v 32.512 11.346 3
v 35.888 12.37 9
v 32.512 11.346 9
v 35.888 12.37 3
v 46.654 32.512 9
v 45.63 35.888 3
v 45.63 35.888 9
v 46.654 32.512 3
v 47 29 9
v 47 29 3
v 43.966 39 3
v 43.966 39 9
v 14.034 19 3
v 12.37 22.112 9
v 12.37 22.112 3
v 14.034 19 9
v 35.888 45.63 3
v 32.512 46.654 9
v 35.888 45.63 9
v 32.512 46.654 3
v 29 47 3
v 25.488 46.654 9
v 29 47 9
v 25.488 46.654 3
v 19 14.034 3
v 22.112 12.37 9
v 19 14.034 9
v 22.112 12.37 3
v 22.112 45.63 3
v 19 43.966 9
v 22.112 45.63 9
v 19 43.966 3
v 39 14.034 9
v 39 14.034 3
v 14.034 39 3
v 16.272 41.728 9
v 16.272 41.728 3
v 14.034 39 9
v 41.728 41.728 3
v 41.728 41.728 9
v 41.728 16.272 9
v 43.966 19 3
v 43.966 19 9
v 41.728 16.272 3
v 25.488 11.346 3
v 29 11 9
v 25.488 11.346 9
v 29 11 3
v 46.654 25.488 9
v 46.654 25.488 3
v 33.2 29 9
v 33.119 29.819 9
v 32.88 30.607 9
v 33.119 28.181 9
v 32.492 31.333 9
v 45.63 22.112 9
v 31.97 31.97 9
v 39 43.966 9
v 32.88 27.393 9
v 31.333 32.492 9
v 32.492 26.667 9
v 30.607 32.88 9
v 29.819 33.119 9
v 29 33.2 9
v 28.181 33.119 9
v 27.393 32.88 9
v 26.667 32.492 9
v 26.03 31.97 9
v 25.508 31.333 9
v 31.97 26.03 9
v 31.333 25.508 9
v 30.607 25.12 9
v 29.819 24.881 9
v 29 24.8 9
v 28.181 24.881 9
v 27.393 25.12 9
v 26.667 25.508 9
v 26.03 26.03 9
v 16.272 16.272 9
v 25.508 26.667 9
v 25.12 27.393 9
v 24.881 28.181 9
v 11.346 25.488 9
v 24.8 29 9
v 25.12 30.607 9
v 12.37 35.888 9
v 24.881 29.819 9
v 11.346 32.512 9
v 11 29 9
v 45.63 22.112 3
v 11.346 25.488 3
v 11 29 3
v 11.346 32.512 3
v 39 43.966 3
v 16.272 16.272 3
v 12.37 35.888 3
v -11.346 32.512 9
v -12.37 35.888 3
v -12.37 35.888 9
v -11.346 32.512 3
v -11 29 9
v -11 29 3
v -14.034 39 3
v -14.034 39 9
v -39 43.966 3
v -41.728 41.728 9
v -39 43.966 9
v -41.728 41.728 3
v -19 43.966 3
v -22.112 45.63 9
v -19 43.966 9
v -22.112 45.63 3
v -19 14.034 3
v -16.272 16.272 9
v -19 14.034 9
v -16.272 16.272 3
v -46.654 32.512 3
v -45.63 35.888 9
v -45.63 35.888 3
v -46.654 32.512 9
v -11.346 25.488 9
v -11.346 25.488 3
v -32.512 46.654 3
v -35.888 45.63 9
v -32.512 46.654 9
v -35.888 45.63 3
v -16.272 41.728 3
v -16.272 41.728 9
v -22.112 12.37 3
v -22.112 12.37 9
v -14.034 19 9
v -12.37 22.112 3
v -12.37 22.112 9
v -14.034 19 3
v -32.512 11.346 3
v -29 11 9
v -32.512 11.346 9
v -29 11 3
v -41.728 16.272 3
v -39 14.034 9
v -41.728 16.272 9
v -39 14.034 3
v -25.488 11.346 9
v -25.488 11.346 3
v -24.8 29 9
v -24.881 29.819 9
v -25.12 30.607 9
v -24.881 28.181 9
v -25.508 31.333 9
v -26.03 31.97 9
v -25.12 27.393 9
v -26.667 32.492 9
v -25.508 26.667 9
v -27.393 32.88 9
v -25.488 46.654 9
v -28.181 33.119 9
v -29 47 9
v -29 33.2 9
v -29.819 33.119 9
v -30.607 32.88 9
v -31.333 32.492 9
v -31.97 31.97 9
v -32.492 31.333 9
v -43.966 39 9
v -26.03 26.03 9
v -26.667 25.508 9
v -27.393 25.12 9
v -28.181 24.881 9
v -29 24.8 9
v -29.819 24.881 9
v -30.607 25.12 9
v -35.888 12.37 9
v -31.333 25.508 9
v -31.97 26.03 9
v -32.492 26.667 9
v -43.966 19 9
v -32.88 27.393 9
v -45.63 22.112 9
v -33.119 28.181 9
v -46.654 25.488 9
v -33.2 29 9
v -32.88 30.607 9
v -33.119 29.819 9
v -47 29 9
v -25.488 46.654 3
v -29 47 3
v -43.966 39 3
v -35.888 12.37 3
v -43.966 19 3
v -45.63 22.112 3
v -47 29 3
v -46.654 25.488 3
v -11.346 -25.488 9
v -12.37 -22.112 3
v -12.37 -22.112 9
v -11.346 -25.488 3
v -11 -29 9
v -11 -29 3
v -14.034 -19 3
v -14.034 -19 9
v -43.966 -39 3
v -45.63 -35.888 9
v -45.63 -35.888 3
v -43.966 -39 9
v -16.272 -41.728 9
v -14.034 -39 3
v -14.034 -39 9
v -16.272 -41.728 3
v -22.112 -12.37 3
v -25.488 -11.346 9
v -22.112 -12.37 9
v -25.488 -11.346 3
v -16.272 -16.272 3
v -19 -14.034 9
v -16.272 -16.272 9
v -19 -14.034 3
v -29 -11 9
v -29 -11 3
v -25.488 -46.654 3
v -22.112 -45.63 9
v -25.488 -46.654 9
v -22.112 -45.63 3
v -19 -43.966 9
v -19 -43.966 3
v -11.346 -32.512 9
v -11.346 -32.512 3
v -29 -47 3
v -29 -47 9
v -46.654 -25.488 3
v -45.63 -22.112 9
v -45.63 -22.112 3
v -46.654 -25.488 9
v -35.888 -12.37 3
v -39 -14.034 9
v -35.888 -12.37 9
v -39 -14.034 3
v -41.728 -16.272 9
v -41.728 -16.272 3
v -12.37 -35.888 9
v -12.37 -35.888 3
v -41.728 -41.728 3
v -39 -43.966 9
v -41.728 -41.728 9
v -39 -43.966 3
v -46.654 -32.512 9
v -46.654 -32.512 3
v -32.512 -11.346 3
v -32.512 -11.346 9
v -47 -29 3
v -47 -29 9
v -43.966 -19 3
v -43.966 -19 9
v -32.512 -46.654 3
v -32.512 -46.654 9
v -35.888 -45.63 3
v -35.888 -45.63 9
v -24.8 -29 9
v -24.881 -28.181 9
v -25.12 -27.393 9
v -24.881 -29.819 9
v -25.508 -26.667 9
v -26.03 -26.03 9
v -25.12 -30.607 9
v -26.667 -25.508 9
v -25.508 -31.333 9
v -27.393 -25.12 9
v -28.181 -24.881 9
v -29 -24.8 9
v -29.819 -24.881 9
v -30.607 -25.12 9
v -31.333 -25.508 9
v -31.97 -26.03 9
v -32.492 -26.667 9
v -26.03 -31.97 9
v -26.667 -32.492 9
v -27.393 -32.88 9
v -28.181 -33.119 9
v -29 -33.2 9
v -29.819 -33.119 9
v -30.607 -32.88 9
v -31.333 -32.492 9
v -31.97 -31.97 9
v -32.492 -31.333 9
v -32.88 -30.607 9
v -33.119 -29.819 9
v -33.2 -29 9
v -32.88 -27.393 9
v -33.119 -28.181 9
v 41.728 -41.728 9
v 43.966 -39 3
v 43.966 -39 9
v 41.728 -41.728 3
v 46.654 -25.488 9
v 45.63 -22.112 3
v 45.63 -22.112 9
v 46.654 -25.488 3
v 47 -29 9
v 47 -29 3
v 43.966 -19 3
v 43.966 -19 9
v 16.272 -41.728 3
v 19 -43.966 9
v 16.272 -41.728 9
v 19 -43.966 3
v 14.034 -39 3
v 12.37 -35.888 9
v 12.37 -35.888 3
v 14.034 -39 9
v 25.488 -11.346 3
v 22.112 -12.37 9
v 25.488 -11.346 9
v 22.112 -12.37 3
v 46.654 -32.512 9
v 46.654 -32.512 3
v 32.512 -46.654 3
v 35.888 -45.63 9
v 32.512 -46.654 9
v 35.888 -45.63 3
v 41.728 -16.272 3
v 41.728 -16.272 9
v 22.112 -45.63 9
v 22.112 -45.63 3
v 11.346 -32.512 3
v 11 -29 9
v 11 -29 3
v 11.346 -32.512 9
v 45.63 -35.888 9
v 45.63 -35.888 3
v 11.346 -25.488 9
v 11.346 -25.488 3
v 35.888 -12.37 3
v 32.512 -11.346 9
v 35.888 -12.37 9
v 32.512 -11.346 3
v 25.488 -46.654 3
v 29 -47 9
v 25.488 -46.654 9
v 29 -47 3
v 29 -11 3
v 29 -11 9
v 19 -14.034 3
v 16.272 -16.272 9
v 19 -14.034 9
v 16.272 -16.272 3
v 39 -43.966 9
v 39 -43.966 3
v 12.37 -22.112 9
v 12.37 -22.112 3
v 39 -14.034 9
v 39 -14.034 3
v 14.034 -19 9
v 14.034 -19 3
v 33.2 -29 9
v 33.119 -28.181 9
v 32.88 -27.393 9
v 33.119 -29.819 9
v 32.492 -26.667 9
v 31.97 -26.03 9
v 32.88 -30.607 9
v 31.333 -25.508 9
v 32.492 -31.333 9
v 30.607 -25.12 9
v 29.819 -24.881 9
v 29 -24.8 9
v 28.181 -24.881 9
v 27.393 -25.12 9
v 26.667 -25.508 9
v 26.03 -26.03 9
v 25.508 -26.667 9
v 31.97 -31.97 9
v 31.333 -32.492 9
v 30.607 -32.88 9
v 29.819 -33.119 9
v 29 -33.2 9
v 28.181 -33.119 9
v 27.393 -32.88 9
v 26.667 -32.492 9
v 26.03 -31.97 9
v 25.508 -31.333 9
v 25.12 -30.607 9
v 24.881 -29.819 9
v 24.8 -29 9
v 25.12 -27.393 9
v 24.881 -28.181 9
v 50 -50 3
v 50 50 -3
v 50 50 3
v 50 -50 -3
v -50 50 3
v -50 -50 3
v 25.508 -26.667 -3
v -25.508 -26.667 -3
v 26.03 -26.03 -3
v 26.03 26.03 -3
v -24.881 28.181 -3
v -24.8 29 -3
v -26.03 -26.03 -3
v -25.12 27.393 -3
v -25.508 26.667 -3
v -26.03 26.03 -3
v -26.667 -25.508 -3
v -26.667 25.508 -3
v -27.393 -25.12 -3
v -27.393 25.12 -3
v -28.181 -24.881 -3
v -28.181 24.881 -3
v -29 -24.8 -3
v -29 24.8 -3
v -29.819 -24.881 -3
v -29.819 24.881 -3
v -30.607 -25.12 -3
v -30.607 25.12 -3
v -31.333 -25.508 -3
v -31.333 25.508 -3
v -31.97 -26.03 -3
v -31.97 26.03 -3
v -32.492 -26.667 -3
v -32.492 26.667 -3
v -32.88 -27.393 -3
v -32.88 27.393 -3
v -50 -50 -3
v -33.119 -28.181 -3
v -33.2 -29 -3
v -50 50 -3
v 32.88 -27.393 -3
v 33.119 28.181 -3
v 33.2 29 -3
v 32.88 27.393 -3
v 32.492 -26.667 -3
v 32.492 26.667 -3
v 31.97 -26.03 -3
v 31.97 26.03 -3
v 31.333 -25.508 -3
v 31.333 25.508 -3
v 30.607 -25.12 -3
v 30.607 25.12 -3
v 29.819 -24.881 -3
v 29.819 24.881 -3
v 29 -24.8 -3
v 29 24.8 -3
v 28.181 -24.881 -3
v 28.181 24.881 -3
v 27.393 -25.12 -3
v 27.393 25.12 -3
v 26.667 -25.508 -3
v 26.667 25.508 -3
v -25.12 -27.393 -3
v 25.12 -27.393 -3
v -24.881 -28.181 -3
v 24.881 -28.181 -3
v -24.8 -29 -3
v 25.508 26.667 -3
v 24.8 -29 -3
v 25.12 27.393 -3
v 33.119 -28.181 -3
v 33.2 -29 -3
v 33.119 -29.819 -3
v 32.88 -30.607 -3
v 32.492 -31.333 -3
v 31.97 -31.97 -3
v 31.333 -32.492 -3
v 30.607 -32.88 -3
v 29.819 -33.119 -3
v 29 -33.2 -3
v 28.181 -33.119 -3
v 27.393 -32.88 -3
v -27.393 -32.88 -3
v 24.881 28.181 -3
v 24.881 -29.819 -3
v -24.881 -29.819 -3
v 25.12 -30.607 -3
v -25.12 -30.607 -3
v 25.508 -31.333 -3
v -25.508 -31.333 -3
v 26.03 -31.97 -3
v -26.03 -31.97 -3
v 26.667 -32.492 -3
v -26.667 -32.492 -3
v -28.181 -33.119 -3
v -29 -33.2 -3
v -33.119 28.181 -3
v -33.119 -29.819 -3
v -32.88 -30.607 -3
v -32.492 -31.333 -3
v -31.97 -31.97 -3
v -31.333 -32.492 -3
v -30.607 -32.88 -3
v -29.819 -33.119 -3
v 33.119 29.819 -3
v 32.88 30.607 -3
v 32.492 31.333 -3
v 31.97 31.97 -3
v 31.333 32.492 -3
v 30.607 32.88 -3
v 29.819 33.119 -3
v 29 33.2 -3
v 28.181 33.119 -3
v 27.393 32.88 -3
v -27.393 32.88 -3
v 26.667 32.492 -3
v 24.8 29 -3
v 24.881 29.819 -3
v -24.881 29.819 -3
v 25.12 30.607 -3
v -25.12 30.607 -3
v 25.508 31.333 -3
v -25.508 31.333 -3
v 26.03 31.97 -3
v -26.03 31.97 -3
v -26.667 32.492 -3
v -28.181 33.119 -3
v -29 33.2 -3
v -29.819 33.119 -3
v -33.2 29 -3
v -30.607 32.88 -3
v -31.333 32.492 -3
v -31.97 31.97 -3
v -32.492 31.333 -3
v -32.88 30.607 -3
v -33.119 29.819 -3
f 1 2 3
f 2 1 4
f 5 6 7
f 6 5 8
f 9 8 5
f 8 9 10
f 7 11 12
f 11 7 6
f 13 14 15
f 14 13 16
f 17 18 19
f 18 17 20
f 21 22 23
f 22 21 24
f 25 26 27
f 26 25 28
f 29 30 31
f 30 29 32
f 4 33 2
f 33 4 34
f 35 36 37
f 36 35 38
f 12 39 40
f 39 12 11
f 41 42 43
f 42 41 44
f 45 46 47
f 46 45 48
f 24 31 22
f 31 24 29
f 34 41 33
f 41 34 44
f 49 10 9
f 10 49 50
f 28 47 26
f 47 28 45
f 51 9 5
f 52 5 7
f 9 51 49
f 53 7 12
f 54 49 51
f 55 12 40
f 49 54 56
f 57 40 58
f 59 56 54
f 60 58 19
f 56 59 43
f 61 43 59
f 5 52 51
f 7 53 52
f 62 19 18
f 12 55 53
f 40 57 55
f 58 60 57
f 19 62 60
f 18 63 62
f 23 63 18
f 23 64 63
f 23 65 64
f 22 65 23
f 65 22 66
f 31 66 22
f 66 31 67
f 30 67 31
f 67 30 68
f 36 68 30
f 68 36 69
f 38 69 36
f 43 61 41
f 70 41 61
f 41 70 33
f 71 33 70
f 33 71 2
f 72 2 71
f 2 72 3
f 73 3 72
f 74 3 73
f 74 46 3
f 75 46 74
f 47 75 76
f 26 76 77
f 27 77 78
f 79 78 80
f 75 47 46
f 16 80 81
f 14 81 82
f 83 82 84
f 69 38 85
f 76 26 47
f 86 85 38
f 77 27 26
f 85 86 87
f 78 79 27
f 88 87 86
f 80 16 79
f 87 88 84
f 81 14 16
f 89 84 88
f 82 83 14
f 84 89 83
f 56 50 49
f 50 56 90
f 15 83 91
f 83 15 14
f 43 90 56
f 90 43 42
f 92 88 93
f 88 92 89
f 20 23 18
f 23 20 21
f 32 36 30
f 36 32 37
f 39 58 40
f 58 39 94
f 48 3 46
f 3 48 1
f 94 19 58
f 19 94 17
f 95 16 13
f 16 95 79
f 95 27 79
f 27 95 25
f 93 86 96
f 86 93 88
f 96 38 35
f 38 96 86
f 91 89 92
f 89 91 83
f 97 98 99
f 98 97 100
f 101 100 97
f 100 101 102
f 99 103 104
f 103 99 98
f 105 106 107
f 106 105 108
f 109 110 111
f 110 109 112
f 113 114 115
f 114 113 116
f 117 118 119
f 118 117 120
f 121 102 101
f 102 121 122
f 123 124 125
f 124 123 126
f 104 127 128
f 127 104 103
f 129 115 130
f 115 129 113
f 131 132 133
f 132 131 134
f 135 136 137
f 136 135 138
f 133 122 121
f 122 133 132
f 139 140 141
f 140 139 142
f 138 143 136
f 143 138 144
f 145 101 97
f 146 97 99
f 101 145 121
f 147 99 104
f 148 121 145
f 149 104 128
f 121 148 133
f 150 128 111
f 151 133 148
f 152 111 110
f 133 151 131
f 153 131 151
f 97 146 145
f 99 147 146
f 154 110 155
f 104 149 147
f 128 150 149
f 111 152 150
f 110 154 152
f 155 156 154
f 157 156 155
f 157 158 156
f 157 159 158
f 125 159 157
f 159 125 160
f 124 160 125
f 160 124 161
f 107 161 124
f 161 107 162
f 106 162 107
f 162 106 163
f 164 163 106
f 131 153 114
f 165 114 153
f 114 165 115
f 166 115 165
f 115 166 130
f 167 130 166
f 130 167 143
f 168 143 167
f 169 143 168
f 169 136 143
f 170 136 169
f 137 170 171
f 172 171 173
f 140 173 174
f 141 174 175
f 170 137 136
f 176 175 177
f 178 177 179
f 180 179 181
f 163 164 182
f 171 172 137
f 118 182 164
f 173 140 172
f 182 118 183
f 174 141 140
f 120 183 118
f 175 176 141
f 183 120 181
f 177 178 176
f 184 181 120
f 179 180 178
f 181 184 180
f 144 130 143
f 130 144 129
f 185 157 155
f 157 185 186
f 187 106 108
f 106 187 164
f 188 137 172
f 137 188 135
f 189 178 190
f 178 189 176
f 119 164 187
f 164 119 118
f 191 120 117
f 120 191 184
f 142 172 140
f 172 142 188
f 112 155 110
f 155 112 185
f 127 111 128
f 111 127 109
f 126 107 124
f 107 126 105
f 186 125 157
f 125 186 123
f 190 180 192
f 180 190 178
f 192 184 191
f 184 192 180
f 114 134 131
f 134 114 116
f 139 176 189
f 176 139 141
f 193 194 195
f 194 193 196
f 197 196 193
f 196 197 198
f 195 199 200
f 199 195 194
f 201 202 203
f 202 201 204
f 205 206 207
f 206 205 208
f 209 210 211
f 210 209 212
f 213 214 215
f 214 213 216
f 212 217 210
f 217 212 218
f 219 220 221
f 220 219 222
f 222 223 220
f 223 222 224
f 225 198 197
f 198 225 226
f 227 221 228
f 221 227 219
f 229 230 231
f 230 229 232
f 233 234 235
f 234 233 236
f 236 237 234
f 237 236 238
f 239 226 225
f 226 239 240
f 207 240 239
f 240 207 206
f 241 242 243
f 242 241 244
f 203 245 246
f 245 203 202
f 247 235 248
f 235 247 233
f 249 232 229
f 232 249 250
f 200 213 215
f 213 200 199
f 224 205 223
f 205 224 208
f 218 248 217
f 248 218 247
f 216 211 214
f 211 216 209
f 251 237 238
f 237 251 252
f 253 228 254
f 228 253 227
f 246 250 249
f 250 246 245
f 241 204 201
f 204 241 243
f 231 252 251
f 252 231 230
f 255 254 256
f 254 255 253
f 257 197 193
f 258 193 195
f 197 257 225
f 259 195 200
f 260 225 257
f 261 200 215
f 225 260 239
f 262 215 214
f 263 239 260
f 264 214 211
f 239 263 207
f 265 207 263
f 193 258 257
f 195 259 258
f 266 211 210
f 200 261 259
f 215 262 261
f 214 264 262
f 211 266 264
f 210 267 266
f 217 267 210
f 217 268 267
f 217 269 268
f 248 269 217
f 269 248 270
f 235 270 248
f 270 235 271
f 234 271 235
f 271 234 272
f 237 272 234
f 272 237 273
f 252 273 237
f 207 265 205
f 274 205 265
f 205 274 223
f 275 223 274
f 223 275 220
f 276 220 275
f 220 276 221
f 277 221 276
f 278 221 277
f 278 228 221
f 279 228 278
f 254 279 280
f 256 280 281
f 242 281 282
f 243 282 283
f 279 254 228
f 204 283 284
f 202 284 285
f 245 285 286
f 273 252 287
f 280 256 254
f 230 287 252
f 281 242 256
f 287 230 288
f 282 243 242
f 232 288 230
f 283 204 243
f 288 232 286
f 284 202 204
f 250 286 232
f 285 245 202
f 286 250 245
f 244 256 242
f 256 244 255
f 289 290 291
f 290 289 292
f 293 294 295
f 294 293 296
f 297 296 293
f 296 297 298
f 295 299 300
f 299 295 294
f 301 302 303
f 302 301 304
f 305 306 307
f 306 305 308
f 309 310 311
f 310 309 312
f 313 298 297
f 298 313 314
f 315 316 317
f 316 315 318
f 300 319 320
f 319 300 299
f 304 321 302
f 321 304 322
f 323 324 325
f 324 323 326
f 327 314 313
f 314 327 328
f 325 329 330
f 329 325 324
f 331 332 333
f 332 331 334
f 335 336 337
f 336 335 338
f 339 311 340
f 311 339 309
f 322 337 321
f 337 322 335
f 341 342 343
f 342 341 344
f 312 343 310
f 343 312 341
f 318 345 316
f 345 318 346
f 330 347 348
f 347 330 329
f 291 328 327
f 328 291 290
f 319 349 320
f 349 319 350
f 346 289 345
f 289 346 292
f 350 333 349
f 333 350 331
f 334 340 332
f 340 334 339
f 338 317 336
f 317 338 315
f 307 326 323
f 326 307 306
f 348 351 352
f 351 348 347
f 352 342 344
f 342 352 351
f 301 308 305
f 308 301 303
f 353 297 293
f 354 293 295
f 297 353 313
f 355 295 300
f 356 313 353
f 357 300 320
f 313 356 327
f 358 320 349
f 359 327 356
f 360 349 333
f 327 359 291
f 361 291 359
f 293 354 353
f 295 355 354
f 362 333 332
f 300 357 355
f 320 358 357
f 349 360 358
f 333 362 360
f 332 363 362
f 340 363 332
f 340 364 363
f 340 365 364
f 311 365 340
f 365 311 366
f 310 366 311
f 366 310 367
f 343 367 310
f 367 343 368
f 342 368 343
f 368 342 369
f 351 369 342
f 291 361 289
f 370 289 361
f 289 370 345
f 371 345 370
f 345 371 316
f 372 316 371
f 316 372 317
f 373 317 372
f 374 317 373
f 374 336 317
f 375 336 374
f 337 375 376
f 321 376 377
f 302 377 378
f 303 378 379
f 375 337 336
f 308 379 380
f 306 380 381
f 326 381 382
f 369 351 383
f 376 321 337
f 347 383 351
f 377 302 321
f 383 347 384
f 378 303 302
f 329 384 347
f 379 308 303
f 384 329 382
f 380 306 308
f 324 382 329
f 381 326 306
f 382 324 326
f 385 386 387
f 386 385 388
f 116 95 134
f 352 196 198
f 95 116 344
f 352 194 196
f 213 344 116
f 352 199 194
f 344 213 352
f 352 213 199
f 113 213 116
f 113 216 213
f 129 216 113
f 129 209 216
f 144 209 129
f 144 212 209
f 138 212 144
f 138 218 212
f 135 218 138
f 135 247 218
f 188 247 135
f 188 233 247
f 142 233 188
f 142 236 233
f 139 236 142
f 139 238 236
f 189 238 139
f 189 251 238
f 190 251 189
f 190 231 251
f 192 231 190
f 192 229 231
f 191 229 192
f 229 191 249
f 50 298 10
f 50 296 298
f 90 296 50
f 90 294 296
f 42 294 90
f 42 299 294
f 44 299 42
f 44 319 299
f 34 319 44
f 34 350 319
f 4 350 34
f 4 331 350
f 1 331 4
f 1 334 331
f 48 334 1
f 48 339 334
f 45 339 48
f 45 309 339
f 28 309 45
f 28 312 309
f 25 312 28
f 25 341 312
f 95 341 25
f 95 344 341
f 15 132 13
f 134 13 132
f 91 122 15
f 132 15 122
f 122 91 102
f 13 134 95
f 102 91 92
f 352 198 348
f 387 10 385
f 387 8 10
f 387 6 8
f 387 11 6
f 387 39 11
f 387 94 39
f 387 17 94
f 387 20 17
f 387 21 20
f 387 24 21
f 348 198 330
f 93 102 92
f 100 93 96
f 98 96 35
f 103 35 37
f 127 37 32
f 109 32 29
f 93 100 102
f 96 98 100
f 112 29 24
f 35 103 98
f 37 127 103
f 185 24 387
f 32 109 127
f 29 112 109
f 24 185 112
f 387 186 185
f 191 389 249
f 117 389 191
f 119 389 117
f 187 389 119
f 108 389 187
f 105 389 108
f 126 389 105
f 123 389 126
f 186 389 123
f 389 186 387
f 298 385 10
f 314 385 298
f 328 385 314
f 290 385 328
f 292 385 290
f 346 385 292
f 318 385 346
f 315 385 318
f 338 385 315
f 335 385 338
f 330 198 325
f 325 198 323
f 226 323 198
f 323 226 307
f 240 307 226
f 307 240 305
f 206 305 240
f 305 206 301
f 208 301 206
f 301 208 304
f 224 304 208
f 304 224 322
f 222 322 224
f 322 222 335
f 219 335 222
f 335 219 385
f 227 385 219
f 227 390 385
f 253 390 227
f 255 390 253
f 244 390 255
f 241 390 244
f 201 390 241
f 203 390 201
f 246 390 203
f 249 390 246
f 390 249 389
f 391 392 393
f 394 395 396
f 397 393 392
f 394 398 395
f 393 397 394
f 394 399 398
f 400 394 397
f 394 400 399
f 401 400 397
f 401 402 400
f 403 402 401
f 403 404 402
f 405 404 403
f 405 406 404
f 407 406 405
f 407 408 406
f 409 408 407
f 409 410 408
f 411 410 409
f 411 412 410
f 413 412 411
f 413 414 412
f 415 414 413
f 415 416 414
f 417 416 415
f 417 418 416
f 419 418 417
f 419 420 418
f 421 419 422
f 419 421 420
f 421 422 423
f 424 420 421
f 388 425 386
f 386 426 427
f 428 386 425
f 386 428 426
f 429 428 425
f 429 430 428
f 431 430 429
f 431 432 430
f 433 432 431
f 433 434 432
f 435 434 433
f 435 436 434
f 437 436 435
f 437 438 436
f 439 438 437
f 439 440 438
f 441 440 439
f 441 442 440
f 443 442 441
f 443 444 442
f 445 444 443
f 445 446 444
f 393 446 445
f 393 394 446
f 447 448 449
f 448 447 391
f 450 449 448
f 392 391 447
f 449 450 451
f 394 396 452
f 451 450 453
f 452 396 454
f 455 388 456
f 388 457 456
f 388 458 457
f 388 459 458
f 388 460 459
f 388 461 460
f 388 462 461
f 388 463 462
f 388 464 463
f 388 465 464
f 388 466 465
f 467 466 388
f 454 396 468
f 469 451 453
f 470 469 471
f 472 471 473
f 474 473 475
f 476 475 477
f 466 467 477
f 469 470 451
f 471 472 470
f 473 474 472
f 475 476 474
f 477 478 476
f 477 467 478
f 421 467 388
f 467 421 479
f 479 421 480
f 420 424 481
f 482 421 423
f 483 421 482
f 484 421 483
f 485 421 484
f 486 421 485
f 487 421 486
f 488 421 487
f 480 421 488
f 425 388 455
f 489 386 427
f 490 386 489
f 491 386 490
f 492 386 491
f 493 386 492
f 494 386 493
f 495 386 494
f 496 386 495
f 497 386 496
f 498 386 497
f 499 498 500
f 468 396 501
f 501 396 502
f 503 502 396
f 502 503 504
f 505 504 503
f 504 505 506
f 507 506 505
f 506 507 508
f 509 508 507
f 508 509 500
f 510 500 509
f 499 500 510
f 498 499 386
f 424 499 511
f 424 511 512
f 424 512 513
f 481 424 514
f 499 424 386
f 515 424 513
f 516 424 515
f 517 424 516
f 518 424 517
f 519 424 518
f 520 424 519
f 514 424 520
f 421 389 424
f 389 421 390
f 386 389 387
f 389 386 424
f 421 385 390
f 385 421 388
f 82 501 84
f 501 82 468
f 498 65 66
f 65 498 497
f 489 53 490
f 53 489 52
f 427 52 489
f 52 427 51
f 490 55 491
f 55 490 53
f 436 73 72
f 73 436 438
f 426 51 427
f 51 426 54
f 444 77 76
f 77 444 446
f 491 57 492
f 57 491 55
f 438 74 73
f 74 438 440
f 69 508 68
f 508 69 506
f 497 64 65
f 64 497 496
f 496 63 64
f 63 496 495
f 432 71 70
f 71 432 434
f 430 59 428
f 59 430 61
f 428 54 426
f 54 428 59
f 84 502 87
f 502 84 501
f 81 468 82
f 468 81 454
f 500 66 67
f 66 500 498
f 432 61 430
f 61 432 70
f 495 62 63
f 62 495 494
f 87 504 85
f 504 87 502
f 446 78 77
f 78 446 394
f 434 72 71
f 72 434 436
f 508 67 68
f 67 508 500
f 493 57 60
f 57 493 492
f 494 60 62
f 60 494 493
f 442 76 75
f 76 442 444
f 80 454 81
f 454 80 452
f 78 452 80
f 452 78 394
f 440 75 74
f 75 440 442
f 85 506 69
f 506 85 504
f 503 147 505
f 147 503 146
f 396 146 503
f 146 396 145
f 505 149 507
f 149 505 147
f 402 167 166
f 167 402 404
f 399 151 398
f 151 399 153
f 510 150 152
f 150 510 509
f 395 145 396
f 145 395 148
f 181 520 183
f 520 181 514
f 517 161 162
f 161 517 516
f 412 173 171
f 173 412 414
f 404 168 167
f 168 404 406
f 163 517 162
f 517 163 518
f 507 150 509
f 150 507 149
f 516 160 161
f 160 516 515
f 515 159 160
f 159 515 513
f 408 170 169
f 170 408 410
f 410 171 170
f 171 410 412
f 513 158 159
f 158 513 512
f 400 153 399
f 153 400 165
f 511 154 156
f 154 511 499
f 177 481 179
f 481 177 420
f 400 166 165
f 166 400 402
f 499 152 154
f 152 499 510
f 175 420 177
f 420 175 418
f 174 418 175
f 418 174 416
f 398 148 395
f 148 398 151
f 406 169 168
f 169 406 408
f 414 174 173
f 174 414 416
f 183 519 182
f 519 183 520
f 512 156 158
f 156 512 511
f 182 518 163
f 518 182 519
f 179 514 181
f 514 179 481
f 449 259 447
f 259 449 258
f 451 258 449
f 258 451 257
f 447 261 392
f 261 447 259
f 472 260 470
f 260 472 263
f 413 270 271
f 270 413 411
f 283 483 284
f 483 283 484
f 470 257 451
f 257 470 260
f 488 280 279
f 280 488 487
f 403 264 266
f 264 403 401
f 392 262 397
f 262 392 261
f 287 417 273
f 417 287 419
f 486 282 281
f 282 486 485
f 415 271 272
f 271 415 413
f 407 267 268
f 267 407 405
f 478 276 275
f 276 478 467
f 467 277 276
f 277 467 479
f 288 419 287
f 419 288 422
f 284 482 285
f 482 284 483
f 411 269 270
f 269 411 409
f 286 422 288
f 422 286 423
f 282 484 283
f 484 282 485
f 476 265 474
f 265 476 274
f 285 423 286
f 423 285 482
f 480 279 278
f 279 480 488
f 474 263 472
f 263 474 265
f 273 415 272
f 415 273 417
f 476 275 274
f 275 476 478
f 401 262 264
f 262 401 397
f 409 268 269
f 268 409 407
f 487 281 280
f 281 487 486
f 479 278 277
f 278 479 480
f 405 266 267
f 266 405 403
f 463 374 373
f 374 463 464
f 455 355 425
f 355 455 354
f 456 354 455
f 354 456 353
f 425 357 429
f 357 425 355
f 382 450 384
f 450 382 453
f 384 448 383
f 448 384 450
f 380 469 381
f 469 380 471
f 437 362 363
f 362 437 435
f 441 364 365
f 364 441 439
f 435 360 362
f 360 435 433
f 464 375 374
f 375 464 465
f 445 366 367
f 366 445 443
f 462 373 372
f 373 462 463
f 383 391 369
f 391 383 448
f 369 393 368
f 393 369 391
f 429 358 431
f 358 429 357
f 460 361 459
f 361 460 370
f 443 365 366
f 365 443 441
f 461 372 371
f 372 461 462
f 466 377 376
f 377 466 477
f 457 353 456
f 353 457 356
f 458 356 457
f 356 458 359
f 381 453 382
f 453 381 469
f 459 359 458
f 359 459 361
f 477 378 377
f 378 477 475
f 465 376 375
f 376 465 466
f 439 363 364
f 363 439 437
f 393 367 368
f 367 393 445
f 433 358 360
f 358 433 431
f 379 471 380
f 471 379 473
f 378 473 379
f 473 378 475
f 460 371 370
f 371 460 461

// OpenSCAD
$fn = 32;

// ----------------------------------------------------------------------
// Anchor pads 100 x 100 x 12
// four corner bosses with anchor holes
// ----------------------------------------------------------------------

// --- parameters (mm) ---
plate = [100, 100, 6];  // base plate size (x, y, z)
pads = 4;               // boss count, one per corner
edge = 21;              // boss centre offset from the plate edge
boss_d = 36;            // boss diameter
boss_h = 6;             // boss height above the base plate
hole_d = 8.4;           // hole diameter

// --- derived feature positions (mm) ---
height = plate[2] + boss_h;      // = 12   overall height of the part
corner_x = plate[0] / 2 - edge;  // = 29   boss centre X
corner_y = plate[1] / 2 - edge;  // = 29   boss centre Y
feature_centers = [
  [corner_x, corner_y],
  [-corner_x, corner_y],
  [-corner_x, -corner_y],
  [corner_x, -corner_y]
];   // boss centres, anchor holes are drilled there

// base plate, four bosses standing on it, anchor holes all the way through
difference() {
  union() {
    cube(plate, center = true);
    for (centre = feature_centers)
      translate([centre[0], centre[1], plate[2] / 2 - 1])
        cylinder(d = boss_d, h = boss_h + 1);
  }
  for (centre = feature_centers)
    translate([centre[0], centre[1], -height])
      cylinder(d = hole_d, h = 2 * height + 2);  // through boss and plate
}
